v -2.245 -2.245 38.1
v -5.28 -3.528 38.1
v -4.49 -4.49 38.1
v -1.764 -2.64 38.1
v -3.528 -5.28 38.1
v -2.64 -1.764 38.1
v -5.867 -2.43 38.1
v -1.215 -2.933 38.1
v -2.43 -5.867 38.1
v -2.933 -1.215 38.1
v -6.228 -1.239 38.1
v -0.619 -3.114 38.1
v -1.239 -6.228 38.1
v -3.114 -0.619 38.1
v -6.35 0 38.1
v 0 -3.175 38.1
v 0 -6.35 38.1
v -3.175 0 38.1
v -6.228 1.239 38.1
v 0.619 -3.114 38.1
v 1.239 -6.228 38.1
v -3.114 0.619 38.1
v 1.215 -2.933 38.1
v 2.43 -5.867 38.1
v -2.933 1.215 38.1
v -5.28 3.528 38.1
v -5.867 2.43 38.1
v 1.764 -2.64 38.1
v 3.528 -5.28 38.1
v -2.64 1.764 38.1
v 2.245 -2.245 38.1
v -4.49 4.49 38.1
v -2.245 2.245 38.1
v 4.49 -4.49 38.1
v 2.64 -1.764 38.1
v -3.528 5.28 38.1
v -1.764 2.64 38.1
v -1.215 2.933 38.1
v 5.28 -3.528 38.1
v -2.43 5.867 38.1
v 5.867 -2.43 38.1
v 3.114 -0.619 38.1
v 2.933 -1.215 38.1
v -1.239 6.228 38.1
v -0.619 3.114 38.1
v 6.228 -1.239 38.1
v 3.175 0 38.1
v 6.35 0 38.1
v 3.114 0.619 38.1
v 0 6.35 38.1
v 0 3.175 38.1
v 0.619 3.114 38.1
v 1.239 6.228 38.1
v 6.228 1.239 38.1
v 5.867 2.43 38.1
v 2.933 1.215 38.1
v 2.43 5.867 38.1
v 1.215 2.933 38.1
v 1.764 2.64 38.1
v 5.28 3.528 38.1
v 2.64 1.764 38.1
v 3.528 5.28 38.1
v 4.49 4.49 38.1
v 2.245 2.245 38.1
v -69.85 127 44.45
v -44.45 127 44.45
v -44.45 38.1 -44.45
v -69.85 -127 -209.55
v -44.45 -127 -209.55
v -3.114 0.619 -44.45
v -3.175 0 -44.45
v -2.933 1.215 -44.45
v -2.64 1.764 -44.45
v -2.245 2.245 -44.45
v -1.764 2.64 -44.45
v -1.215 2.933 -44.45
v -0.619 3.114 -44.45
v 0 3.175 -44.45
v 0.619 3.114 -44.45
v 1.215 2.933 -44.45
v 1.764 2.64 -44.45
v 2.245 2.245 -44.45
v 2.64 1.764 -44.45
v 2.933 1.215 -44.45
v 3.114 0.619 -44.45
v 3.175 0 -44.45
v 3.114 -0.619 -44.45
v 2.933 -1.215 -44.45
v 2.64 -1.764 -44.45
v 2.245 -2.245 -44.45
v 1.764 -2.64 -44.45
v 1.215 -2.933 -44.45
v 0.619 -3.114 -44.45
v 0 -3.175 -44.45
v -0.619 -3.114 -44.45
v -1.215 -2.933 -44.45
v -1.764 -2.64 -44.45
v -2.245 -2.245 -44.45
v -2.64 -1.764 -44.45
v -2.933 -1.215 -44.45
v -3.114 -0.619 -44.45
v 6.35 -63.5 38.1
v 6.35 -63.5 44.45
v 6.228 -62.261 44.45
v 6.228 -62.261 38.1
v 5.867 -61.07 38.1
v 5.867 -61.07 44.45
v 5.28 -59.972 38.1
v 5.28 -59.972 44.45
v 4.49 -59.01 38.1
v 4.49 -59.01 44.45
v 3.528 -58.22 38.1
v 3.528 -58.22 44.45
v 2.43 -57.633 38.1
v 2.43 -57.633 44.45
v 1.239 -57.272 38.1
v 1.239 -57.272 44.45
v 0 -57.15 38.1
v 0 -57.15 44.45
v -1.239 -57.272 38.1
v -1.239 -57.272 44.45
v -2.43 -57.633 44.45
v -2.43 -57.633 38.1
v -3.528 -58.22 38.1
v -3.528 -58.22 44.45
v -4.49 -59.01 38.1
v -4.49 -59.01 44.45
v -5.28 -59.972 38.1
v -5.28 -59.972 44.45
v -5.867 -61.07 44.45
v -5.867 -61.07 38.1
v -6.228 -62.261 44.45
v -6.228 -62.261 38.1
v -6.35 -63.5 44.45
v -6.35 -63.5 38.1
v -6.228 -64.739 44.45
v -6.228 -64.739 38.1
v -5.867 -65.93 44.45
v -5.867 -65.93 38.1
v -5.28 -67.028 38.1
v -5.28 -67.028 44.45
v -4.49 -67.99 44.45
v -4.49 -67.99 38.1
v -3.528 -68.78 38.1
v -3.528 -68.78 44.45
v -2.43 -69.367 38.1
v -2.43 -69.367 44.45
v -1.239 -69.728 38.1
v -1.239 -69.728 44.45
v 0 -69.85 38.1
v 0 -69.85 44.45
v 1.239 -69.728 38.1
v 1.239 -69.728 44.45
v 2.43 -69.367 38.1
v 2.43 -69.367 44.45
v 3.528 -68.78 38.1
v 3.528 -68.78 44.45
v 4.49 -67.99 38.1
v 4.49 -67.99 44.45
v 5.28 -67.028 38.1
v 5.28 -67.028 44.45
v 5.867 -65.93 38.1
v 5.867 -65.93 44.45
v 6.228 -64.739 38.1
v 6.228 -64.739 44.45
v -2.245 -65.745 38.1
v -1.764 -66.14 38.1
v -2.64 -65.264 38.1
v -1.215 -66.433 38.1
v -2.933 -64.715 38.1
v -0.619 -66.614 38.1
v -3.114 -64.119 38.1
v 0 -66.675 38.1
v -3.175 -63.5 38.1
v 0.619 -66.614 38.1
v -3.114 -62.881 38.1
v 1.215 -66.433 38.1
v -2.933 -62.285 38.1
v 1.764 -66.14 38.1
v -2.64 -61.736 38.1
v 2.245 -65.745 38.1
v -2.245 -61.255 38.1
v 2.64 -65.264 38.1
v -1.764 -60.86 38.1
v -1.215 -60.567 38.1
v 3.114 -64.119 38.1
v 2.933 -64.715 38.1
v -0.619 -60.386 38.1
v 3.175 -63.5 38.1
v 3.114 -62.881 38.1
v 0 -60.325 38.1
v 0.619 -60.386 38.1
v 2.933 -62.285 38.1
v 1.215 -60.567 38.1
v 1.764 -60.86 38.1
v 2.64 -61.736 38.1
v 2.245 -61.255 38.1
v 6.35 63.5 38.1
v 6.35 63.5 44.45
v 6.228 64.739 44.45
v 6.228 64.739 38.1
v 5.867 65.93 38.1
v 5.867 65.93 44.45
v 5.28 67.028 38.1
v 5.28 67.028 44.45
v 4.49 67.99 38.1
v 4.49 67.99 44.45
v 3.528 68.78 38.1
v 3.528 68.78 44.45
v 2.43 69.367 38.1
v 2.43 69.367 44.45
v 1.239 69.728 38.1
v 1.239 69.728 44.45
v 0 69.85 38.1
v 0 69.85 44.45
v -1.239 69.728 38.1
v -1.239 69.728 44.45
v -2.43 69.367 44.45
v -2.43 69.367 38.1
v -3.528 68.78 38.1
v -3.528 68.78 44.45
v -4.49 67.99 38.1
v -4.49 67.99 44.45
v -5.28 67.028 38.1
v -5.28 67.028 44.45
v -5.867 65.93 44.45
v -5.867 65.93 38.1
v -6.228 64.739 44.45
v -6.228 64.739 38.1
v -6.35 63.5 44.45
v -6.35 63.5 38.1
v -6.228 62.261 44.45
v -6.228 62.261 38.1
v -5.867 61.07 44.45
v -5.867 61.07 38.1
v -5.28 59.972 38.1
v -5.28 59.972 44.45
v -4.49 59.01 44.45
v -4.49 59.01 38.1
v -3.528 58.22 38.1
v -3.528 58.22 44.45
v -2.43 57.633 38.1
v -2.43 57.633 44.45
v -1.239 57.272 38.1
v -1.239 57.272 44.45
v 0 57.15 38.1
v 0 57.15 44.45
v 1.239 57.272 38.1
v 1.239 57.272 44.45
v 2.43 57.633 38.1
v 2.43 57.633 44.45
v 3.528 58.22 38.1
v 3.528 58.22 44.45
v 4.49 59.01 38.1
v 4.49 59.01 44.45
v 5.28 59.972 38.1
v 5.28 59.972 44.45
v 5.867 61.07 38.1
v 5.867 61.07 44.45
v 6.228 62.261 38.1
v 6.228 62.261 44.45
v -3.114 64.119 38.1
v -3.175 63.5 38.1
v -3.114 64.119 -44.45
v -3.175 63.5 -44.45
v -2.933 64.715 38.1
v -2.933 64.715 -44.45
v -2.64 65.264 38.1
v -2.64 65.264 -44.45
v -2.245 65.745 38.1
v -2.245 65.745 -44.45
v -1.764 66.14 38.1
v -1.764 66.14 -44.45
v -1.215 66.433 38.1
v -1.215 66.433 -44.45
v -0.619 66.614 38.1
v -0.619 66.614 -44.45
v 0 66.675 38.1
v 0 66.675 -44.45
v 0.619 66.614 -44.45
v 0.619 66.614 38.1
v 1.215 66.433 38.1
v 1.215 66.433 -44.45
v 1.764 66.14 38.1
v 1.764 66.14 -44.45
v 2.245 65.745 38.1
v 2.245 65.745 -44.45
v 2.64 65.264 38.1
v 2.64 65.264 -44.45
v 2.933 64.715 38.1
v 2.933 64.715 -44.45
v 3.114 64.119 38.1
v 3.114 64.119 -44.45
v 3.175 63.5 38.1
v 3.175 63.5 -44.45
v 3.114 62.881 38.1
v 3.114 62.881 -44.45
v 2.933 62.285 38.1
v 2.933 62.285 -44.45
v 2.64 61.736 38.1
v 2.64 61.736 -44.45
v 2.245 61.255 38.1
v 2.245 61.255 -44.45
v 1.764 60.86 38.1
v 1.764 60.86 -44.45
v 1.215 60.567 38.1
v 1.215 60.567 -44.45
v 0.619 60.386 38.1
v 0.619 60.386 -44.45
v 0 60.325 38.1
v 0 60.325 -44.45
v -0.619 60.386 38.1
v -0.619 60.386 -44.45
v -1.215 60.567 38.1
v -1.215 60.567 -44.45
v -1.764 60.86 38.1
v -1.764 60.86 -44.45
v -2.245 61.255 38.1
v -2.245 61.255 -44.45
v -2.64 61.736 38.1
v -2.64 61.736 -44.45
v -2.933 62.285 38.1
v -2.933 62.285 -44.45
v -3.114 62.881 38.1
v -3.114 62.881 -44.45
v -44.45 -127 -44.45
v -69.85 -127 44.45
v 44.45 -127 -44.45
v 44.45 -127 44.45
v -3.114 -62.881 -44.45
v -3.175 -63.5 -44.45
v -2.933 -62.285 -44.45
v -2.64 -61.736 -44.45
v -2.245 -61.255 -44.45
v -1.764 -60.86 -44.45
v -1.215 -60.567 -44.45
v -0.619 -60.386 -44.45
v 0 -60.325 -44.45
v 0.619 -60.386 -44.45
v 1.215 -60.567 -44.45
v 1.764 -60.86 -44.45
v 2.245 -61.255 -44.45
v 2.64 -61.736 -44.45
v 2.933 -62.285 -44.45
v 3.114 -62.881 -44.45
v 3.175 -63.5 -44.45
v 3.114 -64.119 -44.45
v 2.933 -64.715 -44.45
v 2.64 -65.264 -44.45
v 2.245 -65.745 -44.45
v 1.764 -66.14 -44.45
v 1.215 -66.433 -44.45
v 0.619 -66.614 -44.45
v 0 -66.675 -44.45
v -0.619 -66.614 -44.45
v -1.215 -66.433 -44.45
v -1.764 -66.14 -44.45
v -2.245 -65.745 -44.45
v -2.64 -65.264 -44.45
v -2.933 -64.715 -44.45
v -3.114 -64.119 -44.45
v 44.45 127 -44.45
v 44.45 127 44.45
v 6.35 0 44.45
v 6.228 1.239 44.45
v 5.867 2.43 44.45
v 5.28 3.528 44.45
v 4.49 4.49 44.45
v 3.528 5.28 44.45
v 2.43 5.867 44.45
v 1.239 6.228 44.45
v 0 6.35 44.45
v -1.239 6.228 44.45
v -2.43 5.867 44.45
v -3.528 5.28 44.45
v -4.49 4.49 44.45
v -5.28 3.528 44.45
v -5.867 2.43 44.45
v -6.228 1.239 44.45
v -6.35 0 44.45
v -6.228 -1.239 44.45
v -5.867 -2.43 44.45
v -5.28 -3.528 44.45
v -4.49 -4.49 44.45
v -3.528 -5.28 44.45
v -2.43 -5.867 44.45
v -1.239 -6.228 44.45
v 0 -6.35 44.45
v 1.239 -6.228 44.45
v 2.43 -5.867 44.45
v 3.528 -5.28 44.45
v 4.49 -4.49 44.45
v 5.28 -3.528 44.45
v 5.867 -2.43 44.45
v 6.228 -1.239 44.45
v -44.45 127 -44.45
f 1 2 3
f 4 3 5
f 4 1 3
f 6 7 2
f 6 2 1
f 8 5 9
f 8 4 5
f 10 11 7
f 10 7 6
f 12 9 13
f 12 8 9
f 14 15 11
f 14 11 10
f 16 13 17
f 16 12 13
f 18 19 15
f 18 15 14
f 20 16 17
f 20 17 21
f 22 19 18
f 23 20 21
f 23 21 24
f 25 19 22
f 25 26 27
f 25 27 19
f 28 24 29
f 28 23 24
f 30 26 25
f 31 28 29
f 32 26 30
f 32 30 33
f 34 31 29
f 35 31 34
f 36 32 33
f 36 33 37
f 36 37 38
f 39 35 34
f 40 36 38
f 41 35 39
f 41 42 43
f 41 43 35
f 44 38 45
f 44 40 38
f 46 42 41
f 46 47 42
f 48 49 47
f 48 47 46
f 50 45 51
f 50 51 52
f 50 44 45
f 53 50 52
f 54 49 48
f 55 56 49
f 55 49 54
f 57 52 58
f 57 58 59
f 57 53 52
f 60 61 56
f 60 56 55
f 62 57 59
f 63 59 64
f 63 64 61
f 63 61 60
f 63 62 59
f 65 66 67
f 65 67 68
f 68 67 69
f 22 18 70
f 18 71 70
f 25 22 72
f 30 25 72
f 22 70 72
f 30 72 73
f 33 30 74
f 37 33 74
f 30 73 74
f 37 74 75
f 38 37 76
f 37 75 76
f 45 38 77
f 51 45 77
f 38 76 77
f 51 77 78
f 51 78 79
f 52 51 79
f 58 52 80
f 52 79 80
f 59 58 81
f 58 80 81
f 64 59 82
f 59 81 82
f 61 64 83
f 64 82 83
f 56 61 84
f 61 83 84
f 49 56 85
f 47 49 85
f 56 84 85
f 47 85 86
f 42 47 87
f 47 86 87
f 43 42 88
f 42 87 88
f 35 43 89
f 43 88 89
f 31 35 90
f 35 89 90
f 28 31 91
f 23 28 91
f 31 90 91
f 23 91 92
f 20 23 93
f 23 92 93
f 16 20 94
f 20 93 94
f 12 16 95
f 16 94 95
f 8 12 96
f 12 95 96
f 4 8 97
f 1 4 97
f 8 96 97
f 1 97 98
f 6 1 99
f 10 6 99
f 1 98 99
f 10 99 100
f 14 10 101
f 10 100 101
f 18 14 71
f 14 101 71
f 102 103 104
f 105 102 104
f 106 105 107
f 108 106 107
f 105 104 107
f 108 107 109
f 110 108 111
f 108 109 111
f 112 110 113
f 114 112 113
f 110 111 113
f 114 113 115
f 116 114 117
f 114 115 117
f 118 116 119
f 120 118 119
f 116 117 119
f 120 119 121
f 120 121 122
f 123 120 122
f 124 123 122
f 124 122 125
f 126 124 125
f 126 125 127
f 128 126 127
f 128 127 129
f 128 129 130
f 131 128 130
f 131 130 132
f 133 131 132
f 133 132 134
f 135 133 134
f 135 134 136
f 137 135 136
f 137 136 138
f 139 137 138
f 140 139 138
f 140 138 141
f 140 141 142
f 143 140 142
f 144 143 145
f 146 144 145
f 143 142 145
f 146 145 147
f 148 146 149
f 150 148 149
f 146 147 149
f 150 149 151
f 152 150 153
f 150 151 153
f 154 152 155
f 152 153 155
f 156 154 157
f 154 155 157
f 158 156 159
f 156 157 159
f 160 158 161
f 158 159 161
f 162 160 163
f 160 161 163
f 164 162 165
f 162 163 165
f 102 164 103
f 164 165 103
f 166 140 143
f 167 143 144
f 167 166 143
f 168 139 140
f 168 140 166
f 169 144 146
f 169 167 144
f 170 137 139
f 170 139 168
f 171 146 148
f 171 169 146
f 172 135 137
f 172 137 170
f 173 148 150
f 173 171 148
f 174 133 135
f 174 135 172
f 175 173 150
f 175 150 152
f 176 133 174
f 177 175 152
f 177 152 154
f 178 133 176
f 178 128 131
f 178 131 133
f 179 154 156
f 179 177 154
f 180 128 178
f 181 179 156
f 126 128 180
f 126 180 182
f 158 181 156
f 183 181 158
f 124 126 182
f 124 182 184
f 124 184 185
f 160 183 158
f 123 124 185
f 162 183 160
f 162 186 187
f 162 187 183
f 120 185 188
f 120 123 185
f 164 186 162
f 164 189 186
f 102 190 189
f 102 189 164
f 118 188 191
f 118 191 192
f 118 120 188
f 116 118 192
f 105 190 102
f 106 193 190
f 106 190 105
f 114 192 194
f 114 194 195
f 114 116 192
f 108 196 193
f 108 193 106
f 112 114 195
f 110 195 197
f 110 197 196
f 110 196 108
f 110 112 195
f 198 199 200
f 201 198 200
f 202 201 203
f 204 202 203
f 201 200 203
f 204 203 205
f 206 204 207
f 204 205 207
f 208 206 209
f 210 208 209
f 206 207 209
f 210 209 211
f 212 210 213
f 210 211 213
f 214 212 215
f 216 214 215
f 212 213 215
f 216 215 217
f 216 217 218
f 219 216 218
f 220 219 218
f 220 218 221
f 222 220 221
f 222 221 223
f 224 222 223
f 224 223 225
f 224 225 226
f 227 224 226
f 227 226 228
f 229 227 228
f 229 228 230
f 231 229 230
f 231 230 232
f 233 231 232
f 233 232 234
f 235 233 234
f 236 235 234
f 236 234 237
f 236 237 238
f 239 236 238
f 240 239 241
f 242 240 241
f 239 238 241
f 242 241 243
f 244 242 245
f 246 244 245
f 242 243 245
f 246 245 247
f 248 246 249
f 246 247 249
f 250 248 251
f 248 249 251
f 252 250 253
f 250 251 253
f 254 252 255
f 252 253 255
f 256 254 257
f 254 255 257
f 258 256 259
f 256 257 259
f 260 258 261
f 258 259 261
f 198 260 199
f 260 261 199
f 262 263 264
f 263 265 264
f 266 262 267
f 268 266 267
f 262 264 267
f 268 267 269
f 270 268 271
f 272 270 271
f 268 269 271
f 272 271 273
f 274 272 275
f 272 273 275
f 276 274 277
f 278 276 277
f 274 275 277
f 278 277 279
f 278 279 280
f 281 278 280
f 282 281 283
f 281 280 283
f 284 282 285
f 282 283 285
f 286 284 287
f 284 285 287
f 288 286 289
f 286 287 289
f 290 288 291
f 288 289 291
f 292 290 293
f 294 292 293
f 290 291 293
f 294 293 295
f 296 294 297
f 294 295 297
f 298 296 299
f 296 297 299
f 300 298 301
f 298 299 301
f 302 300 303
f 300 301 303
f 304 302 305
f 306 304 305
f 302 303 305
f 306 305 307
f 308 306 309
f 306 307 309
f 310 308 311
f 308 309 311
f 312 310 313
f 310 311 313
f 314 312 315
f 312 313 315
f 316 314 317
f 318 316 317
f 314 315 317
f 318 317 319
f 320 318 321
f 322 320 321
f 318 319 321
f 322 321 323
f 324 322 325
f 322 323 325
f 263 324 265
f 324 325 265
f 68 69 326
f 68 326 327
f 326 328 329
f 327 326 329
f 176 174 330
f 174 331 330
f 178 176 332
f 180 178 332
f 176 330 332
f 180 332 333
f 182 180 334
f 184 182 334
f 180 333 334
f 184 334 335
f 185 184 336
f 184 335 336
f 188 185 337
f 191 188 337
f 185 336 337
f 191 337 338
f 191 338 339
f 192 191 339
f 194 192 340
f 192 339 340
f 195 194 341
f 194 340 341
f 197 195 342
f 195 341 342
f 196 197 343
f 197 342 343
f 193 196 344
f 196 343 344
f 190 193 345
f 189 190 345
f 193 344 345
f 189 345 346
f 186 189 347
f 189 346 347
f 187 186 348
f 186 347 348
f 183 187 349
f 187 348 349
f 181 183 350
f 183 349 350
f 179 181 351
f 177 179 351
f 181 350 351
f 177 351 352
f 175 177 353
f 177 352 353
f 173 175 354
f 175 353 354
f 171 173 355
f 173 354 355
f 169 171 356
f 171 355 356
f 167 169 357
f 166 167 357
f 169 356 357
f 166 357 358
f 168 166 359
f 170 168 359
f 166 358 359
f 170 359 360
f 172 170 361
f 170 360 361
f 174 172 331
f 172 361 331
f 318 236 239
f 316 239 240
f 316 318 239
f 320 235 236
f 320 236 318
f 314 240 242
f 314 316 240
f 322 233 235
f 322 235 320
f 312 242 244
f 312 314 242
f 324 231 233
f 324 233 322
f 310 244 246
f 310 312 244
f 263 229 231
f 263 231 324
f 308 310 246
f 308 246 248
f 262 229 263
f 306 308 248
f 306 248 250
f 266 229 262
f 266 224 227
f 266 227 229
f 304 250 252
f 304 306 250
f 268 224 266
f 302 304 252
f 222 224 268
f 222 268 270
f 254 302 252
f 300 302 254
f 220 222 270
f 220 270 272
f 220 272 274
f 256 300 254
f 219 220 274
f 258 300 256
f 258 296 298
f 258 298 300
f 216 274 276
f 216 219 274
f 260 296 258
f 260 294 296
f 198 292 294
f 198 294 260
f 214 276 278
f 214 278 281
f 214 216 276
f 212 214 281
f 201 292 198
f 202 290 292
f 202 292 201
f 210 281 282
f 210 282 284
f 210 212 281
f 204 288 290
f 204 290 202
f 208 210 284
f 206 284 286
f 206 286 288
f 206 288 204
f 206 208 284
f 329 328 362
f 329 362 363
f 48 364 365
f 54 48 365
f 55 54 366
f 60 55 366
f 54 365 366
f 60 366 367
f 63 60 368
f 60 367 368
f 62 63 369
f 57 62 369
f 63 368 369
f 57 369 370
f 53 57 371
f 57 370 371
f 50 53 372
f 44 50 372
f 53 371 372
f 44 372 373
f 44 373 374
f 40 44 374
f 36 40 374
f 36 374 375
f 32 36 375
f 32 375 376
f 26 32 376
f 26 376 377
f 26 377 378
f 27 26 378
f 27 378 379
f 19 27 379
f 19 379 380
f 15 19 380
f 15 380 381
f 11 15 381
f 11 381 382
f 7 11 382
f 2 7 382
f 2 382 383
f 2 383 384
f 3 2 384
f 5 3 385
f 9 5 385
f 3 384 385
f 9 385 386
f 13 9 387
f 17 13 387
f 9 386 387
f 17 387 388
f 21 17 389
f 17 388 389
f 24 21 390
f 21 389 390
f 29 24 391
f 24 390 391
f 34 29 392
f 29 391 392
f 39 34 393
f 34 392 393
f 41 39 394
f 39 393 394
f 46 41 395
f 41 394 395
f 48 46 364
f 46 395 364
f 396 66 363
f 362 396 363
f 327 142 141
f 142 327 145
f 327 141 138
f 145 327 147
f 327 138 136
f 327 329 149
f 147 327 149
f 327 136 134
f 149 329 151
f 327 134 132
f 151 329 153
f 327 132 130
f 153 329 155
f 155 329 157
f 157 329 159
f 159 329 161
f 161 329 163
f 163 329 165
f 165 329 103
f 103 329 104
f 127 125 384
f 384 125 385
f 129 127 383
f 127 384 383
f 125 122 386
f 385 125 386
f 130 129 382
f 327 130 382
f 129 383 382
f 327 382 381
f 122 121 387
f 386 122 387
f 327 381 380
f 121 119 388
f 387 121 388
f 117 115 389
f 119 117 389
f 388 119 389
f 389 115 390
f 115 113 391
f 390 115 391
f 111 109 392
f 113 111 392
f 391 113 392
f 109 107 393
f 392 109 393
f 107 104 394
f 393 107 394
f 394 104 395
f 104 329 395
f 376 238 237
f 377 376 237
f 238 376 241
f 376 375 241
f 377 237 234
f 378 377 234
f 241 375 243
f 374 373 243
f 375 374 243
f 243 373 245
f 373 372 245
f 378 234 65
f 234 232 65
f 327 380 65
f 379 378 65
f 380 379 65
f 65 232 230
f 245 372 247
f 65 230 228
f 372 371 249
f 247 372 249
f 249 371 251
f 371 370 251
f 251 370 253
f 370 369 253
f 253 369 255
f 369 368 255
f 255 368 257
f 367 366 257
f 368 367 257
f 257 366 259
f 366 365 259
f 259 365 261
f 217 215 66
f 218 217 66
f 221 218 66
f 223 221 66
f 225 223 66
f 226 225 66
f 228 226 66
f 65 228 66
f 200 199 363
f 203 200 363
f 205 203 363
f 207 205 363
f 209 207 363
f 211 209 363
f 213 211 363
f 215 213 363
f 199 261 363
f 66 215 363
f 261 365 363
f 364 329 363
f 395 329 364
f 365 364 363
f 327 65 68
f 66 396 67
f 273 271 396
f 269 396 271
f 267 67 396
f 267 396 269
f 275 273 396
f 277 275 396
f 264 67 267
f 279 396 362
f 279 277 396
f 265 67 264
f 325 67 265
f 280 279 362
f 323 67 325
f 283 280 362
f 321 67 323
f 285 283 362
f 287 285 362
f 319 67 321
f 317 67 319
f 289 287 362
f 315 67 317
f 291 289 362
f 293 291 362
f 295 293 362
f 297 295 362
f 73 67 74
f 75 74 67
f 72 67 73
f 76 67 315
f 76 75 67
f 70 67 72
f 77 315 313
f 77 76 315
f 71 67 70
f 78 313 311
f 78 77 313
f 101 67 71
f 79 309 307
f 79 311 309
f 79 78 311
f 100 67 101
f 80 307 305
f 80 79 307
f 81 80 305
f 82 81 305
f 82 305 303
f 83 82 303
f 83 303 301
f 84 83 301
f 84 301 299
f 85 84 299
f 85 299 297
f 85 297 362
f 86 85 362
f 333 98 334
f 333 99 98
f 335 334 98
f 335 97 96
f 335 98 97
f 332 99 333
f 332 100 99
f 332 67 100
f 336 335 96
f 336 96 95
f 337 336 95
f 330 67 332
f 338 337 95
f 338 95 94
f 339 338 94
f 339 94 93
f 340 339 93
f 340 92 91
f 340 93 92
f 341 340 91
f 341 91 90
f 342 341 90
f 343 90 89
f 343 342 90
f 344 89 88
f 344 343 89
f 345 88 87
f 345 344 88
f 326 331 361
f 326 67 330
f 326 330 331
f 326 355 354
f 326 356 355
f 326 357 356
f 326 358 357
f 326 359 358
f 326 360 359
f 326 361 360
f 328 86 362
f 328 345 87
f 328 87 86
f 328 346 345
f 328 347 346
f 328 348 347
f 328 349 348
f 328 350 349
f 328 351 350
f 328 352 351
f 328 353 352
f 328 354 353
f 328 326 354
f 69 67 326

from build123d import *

# Parameters (mm, degrees)
F0_W           = 88.9
F0_H           = 88.9
F1_DEPTH       = 127
F3_D           = 6.35
F3_CBORE_D     = 12.7
F3_CBORE_DEPTH = 6.35
F6_DEPTH       = 25.4


with BuildPart() as f1:
    # F0 (on Front) → F1 (new body, symmetric)
    with BuildSketch(Plane.XZ):
        Rectangle(F0_W, F0_H)
    extrude(amount=F1_DEPTH, both=True)

    # F3 (through all)
    with Locations(Plane.XY.offset(44.45)):
        with Locations((0, 63.5), (0, 0), (0, -63.5)):
            CounterBoreHole(F3_D / 2, F3_CBORE_D / 2, F3_CBORE_DEPTH)

    # F5 (on face) → F6 (join)
    with BuildSketch(Plane(origin=(-44.45, 0, 0), x_dir=(0, -1, 0), z_dir=(-1, 0, 0))):
        Polygon((127, 44.45), (-127, 44.45), (127, -209.55), align=None)
    extrude(amount=F6_DEPTH)


solid = f1.part
